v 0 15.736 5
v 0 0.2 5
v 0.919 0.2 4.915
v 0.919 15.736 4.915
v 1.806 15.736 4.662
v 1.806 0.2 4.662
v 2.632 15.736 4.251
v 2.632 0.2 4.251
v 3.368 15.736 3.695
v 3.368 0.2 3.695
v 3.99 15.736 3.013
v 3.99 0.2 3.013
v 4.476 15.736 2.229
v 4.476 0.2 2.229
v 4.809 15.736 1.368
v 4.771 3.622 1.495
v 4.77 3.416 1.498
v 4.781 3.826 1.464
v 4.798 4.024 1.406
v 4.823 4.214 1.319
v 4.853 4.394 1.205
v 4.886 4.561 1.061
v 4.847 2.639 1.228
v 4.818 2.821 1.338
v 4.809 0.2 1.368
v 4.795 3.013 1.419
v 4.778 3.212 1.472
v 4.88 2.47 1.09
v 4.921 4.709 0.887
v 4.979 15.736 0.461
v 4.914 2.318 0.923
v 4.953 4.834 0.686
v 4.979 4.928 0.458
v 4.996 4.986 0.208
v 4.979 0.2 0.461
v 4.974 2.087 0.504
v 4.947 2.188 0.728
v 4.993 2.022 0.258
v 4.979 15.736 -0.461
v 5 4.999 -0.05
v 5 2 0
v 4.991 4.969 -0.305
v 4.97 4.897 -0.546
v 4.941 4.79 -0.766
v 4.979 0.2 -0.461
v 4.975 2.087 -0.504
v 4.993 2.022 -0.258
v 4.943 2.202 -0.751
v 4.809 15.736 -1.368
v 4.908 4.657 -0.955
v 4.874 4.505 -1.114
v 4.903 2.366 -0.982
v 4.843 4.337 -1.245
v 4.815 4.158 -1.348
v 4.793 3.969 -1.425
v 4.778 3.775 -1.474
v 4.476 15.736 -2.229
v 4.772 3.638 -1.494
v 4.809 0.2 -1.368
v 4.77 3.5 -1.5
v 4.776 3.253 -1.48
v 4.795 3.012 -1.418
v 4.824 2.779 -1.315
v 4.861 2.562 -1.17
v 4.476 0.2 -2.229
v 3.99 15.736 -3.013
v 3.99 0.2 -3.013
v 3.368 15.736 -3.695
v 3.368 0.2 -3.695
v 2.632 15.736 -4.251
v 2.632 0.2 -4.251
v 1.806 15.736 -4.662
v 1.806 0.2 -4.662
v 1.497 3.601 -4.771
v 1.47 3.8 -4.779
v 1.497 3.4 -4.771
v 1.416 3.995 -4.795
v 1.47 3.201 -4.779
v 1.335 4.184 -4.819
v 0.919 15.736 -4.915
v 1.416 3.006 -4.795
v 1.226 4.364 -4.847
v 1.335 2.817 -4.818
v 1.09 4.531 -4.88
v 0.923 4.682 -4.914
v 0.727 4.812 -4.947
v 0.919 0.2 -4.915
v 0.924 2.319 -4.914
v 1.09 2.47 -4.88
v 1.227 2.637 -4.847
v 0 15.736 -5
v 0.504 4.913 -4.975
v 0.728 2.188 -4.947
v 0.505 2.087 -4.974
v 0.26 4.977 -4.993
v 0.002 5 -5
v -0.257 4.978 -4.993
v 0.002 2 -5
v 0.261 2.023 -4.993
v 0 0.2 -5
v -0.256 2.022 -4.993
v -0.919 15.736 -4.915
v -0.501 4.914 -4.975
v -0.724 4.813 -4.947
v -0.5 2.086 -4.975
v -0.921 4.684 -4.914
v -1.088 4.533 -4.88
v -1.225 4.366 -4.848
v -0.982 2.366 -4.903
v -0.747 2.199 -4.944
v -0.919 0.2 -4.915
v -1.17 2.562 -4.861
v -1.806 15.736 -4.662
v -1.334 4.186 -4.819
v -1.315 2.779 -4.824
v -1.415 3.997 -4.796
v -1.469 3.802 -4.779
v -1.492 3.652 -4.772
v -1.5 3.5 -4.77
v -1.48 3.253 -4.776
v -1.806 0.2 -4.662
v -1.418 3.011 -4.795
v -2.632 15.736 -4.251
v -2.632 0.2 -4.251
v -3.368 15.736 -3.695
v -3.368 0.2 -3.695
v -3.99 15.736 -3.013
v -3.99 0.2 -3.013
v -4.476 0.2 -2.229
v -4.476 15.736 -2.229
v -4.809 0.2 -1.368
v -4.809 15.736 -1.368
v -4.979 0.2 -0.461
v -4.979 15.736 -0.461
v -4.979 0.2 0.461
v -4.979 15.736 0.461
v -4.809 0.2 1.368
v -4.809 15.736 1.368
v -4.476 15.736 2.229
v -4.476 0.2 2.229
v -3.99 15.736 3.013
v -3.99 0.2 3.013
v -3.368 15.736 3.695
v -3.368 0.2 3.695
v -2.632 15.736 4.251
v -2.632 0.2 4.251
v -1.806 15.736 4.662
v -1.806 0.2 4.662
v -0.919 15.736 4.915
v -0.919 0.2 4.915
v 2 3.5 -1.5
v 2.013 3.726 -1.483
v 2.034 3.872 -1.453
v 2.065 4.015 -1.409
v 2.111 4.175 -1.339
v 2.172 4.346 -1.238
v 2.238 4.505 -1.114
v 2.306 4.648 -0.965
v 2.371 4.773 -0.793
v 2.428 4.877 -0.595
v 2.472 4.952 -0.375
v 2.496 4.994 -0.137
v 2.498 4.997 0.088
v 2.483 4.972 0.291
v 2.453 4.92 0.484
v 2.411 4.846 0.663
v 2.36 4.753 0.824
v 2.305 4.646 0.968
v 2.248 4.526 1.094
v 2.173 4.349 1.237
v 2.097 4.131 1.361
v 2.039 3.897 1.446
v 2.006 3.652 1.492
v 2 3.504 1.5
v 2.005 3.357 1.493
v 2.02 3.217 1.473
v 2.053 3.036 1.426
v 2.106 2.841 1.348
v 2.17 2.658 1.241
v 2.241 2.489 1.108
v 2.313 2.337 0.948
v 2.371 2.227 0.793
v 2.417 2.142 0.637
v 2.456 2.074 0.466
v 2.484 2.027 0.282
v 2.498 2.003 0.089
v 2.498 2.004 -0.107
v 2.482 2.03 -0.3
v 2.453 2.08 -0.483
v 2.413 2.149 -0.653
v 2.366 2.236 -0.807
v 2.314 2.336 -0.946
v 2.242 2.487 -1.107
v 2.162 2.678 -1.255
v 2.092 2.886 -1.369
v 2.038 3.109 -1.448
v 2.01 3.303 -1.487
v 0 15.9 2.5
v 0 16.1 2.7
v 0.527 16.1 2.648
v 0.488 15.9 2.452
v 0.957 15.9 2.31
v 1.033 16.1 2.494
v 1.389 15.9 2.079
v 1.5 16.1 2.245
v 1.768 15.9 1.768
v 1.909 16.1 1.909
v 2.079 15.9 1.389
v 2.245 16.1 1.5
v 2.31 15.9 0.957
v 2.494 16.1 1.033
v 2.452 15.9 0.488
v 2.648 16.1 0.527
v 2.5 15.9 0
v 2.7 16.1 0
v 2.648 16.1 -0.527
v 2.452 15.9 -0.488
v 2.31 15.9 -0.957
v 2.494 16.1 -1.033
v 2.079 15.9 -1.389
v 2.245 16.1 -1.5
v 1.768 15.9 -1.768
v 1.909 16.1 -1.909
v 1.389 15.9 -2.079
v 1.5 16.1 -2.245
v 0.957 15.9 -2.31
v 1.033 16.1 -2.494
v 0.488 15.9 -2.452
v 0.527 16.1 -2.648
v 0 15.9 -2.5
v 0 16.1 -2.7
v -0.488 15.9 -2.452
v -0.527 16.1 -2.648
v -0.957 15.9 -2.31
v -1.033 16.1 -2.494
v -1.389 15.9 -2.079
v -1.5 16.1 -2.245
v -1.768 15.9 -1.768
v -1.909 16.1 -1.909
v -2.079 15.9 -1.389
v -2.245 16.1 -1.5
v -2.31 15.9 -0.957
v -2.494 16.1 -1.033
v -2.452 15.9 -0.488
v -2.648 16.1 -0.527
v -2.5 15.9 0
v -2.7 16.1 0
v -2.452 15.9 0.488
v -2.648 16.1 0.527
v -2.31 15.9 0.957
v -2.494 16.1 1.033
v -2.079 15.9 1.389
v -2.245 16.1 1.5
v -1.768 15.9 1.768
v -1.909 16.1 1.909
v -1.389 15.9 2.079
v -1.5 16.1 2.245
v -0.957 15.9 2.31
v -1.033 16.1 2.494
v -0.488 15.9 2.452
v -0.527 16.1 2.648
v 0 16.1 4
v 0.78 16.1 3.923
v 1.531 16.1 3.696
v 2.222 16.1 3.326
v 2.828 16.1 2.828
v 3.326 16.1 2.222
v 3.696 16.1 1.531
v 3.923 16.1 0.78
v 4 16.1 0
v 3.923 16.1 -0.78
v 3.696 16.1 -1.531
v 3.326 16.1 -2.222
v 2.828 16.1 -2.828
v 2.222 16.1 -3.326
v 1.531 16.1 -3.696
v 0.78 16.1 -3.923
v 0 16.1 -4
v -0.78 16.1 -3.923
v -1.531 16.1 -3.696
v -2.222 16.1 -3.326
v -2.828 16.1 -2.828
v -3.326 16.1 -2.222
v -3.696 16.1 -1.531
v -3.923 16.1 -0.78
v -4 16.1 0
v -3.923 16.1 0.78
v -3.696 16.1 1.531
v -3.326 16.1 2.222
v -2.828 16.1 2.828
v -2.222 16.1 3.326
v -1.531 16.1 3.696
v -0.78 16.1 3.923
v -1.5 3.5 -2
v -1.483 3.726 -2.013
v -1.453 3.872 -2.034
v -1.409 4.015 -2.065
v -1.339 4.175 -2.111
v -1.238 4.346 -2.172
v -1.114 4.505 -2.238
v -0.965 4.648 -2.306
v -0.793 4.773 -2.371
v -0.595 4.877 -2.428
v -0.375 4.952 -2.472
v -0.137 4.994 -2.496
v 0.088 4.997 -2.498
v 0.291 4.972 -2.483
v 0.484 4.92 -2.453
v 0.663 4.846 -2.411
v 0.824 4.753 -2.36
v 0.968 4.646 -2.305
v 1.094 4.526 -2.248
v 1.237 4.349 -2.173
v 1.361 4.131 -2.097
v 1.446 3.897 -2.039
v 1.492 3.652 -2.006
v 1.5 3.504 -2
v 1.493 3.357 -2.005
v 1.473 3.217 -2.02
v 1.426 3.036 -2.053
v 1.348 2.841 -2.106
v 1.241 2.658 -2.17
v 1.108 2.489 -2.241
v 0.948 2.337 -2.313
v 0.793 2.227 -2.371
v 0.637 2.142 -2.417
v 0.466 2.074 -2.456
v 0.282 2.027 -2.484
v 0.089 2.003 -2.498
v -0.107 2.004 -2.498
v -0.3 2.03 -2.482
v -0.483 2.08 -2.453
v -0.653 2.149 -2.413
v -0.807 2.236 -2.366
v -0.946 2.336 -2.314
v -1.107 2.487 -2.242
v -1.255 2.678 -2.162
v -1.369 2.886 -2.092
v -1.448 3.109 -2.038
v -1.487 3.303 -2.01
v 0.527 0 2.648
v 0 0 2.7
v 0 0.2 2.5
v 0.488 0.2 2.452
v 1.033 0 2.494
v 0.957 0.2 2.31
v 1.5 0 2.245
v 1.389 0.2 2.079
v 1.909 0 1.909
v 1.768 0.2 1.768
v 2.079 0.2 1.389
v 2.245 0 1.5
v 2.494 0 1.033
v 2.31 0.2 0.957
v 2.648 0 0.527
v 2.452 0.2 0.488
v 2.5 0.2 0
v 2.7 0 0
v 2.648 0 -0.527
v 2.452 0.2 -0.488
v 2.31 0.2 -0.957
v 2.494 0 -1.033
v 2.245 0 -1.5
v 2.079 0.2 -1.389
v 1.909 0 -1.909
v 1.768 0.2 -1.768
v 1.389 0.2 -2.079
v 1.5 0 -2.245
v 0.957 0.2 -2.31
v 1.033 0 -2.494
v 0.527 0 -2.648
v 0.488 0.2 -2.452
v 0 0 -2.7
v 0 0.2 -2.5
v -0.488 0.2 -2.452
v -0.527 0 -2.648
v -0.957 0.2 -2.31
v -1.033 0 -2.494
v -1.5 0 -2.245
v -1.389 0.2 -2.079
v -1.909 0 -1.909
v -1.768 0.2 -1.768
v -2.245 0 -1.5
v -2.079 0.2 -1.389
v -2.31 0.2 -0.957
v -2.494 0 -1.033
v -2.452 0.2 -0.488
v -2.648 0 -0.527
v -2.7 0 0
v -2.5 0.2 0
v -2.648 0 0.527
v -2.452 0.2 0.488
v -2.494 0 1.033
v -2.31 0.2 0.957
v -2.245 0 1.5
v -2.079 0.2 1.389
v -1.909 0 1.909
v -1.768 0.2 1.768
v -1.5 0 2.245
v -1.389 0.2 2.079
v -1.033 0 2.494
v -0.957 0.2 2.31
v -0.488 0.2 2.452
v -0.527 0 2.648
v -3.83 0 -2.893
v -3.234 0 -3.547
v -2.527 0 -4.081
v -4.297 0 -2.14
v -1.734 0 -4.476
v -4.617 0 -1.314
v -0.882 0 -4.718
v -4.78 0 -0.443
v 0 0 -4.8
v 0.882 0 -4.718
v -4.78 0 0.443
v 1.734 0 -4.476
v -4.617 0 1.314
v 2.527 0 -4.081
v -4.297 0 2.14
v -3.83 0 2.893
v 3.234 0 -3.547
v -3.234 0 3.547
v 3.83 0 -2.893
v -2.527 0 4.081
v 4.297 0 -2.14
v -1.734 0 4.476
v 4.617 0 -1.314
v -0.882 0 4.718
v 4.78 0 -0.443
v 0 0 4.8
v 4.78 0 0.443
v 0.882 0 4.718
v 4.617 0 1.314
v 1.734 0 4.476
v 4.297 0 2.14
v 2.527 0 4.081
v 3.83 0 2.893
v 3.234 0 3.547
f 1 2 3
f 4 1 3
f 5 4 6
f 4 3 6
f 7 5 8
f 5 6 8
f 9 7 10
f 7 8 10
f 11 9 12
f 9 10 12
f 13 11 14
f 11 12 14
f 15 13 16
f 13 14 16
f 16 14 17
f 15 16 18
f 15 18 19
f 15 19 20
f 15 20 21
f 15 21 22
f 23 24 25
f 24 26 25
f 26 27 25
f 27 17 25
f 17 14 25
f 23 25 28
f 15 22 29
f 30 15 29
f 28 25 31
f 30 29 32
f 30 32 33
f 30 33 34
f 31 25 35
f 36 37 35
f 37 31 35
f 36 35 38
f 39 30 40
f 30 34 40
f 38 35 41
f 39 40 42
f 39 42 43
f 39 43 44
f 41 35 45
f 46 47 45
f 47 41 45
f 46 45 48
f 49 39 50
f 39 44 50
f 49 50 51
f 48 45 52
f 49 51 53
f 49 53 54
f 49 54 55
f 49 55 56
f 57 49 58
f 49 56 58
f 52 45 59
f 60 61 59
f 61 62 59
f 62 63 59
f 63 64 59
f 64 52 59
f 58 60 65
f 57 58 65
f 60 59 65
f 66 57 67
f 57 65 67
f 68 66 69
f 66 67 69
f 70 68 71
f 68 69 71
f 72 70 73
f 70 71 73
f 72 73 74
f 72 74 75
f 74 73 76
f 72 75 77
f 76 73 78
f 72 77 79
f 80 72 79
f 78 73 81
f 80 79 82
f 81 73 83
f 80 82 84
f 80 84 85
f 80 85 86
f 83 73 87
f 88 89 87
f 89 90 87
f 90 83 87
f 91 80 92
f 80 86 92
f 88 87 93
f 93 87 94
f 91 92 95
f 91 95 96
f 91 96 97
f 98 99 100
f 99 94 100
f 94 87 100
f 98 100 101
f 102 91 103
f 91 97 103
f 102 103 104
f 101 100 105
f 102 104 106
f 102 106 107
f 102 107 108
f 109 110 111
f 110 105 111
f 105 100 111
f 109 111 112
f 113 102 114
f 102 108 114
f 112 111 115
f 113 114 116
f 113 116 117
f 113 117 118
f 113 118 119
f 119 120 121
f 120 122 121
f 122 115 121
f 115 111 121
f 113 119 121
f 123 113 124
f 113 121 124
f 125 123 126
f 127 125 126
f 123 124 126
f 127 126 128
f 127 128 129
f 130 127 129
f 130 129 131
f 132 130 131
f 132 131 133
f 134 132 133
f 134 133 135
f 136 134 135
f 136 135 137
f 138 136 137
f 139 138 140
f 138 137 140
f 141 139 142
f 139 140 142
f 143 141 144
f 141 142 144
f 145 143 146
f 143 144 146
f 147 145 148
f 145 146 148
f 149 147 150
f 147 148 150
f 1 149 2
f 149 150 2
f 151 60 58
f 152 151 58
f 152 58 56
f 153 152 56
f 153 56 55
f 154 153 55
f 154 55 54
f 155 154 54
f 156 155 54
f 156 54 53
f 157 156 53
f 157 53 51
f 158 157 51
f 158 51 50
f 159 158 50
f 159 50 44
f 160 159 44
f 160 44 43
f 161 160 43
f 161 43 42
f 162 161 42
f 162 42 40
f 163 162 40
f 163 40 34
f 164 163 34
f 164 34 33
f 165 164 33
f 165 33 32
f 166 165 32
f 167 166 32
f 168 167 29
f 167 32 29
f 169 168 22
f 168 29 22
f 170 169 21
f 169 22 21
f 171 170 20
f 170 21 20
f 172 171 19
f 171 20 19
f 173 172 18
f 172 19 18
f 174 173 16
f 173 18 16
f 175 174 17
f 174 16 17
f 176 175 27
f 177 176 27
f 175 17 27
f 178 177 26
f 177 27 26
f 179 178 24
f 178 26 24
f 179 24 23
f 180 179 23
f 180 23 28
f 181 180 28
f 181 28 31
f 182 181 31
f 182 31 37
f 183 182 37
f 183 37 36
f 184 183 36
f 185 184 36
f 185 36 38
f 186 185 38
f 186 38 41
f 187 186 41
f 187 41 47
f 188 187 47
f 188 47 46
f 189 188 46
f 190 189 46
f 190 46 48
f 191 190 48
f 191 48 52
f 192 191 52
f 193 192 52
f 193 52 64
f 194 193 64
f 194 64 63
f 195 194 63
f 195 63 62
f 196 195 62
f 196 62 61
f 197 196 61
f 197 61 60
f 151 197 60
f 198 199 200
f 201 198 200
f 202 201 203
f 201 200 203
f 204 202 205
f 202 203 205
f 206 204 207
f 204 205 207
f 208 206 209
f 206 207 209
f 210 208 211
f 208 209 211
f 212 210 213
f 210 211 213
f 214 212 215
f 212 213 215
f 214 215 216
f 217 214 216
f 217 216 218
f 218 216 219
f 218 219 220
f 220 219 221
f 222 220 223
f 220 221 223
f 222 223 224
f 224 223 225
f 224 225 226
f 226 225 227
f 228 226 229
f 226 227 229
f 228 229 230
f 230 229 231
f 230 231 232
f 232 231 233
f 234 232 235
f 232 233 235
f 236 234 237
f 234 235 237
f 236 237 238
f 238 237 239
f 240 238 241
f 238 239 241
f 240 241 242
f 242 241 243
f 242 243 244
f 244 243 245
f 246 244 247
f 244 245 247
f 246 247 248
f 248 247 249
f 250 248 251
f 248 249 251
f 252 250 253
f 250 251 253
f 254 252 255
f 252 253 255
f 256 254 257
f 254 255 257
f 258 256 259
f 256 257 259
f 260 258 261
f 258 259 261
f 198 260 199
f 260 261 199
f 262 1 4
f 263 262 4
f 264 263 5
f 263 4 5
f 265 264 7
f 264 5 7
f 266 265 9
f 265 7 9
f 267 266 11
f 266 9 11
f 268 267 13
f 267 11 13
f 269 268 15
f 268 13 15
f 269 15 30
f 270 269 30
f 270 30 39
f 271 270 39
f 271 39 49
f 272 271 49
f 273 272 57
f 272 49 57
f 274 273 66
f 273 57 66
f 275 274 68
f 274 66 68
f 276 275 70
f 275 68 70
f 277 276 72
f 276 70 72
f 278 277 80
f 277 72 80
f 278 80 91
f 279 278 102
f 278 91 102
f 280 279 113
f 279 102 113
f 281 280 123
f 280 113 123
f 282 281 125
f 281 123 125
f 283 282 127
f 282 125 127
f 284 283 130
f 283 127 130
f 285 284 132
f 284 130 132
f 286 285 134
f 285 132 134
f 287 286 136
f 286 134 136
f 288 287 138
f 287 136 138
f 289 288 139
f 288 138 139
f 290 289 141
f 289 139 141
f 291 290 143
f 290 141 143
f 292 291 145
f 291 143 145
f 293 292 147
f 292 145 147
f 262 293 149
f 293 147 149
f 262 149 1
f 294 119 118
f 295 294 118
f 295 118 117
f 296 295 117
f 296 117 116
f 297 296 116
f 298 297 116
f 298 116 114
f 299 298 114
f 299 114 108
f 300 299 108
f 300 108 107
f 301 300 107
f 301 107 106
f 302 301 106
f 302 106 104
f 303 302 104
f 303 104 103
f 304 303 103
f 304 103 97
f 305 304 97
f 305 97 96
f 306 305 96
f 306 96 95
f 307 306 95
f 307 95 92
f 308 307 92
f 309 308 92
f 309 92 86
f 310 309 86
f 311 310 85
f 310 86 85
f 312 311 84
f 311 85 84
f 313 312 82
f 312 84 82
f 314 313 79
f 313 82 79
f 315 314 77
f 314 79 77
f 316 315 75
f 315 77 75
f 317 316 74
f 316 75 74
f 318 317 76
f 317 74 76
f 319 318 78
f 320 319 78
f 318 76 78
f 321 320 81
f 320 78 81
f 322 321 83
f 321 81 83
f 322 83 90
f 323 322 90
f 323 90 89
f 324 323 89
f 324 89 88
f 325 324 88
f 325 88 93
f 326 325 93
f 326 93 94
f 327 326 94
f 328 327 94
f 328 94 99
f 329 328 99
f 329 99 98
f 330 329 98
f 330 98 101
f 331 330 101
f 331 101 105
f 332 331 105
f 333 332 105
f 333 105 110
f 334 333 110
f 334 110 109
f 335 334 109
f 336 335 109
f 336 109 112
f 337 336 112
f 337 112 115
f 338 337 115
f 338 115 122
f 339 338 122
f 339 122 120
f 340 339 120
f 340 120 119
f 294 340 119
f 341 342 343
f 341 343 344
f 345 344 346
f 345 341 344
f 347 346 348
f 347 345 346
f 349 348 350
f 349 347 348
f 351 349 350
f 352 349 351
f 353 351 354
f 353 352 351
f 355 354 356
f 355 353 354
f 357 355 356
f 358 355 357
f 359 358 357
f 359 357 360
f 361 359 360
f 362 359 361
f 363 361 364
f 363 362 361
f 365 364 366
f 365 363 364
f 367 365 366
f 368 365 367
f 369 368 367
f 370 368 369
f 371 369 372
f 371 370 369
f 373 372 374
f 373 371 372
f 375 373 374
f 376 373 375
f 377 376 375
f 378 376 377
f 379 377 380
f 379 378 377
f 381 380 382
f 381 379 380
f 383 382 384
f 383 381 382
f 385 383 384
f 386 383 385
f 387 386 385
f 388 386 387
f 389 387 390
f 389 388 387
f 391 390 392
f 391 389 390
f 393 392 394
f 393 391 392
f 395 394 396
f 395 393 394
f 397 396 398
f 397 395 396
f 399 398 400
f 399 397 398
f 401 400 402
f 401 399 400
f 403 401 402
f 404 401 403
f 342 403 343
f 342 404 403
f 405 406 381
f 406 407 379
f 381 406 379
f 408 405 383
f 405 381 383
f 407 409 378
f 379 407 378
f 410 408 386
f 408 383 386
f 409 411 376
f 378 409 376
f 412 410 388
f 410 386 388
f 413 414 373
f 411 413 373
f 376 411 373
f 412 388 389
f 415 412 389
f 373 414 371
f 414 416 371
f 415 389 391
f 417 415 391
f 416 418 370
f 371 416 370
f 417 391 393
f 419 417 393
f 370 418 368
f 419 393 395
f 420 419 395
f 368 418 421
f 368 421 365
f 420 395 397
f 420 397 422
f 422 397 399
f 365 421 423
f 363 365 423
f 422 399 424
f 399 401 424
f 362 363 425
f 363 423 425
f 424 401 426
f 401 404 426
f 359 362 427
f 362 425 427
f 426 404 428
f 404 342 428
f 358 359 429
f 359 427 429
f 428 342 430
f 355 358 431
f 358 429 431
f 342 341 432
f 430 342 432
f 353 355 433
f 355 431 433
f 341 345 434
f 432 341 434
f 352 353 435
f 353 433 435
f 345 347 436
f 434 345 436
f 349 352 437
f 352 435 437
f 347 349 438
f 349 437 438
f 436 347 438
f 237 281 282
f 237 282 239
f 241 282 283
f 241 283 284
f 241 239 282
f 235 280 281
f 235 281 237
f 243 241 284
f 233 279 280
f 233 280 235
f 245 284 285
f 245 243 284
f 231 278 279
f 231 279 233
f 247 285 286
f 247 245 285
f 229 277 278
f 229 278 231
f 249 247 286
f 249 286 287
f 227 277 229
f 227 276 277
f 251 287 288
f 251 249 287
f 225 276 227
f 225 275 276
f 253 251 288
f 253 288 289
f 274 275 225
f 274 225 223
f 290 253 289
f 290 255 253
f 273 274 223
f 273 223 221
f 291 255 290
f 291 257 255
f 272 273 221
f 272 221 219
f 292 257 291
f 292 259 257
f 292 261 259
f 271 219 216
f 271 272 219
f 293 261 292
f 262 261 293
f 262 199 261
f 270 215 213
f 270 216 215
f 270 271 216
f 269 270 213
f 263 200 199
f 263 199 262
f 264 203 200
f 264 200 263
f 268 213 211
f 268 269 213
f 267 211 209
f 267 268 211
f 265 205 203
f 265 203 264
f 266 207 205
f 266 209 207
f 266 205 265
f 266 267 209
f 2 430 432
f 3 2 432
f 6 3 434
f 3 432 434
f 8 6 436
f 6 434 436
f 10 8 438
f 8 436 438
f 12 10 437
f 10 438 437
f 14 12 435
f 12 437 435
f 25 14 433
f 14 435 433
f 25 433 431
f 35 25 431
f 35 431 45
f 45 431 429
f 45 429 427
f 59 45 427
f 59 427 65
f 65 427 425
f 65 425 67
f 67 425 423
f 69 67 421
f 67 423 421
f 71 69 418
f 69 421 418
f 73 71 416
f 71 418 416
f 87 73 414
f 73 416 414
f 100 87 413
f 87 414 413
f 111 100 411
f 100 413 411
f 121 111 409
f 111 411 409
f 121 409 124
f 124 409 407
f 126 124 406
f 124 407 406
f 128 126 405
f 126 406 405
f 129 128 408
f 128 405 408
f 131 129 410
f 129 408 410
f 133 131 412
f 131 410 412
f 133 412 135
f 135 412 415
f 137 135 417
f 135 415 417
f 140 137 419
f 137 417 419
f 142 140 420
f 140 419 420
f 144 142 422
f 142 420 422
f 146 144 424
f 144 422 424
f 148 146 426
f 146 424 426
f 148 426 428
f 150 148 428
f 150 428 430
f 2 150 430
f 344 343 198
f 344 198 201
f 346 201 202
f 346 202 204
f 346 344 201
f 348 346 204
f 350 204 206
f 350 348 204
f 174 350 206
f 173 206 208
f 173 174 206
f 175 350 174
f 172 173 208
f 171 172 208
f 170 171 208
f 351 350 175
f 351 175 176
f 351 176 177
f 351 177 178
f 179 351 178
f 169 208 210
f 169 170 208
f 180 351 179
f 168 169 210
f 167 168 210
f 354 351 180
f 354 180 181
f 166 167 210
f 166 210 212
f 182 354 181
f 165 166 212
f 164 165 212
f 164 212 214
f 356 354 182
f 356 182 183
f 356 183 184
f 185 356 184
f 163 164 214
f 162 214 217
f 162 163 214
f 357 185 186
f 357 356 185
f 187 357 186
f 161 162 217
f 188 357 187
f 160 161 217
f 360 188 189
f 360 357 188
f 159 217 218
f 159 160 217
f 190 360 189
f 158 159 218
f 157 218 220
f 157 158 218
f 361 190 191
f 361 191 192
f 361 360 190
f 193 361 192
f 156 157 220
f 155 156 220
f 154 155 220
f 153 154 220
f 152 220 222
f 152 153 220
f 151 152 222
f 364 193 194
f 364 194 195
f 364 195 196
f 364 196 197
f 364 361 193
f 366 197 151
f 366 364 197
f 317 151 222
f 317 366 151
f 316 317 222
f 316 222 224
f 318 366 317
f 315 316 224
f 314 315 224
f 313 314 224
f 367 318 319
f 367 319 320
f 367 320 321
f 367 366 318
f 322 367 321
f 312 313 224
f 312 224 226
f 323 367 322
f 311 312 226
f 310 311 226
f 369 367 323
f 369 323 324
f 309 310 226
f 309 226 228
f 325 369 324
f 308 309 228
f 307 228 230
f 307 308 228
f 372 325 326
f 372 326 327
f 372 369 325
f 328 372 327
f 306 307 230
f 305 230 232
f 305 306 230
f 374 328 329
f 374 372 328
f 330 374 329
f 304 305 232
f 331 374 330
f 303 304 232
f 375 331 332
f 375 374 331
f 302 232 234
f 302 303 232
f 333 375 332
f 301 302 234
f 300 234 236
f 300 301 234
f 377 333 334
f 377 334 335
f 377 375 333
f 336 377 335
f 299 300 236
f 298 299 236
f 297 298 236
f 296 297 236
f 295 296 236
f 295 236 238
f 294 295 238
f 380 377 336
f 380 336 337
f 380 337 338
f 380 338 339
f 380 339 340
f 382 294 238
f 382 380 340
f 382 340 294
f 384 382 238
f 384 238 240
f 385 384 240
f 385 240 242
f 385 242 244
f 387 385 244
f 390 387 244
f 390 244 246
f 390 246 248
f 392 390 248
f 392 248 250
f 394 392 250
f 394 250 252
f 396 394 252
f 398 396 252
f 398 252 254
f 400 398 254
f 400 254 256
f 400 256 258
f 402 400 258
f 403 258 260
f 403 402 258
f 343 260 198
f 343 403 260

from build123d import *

# Parameters (mm, degrees)
SKETCH1_R               = 5
SKETCH1_R_2             = 2.5
BOSS_EXTRUDE1_DEPTH     = 16.1
CHAMFER1_SIZE           = 0.2
CHAMFER2_SIZE           = 1
CHAMFER2_SIZE2          = 0.363970234
CUT_EXTRUDE1_REACH      = 21.601
CUT_EXTRUDE1_END_RADIUS = 2.5
SKETCH2_R               = 1.5
CIRPATTERN1_COUNT       = 2
CIRPATTERN1_ANGLE       = 90


with BuildPart() as part:
    # Sketch1 → Boss-Extrude1 (new body)
    with BuildSketch(Plane(origin=(0, 0, 0), x_dir=(1, 0, 0), z_dir=(0, 1, 0))):
        with Locations(Location((0, 0, 0), (0, 0, 270))):
            Circle(SKETCH1_R)
        with Locations(Location((0, 0, 0), (0, 0, 270))):
            Circle(SKETCH1_R_2, mode=Mode.SUBTRACT)
    extrude(amount=BOSS_EXTRUDE1_DEPTH)

    # Chamfer1
    chamfer1_edges = [part.edges().sort_by_distance(p)[0] for p in [
        (0, 0, -5),
        (0, 0, -2.5),
        (0, 16.1, -2.5),
    ]]
    chamfer(chamfer1_edges, length=CHAMFER1_SIZE)

    # Chamfer2
    chamfer2_edges = [part.edges().sort_by_distance(p)[0] for p in [
        (0, 16.1, -5),
    ]]
    chamfer2_side = [part.faces().sort_by_distance(p)[0] for p in [
        (0, 16.1, -2.841421356),
    ]]
    chamfer(chamfer2_edges, length=CHAMFER2_SIZE, length2=CHAMFER2_SIZE2, reference=chamfer2_side[0])

    # Cut-Extrude1: up to this cylinder (the profile starts outside it)
    cut_extrude1_end = Plane(origin=(0, 3.5, 0), z_dir=(0, -1, 0)) * Cylinder(CUT_EXTRUDE1_END_RADIUS, 49.202, mode=Mode.PRIVATE)
    # Sketch2 → Cut-Extrude1 (cut, up to the surface)
    with BuildSketch(Plane(origin=(0, 0, -5), x_dir=(-1, 0, 0), z_dir=(0, 0, -1)), mode=Mode.PRIVATE) as cut_extrude1_sk1:
        with Locations((0, 3.5)):
            Circle(SKETCH2_R)
    cut_extrude1_tool1 = extrude(cut_extrude1_sk1.sketch, amount=-CUT_EXTRUDE1_REACH, mode=Mode.PRIVATE) - cut_extrude1_end
    cut_extrude1 = cut_extrude1_tool1.solids().sort_by_distance((0, 3.5, -5))[0]
    add(cut_extrude1, mode=Mode.SUBTRACT)

    # CirPattern1: Cut-Extrude1 ×2 about axis
    cirpattern1_axis = Axis((0, 15.9, 0), (0, -1, 0))
    for i in range(1, CIRPATTERN1_COUNT):
        add(cut_extrude1.rotate(cirpattern1_axis, i * CIRPATTERN1_ANGLE / (CIRPATTERN1_COUNT - 1)), mode=Mode.SUBTRACT)


solid = part.part
